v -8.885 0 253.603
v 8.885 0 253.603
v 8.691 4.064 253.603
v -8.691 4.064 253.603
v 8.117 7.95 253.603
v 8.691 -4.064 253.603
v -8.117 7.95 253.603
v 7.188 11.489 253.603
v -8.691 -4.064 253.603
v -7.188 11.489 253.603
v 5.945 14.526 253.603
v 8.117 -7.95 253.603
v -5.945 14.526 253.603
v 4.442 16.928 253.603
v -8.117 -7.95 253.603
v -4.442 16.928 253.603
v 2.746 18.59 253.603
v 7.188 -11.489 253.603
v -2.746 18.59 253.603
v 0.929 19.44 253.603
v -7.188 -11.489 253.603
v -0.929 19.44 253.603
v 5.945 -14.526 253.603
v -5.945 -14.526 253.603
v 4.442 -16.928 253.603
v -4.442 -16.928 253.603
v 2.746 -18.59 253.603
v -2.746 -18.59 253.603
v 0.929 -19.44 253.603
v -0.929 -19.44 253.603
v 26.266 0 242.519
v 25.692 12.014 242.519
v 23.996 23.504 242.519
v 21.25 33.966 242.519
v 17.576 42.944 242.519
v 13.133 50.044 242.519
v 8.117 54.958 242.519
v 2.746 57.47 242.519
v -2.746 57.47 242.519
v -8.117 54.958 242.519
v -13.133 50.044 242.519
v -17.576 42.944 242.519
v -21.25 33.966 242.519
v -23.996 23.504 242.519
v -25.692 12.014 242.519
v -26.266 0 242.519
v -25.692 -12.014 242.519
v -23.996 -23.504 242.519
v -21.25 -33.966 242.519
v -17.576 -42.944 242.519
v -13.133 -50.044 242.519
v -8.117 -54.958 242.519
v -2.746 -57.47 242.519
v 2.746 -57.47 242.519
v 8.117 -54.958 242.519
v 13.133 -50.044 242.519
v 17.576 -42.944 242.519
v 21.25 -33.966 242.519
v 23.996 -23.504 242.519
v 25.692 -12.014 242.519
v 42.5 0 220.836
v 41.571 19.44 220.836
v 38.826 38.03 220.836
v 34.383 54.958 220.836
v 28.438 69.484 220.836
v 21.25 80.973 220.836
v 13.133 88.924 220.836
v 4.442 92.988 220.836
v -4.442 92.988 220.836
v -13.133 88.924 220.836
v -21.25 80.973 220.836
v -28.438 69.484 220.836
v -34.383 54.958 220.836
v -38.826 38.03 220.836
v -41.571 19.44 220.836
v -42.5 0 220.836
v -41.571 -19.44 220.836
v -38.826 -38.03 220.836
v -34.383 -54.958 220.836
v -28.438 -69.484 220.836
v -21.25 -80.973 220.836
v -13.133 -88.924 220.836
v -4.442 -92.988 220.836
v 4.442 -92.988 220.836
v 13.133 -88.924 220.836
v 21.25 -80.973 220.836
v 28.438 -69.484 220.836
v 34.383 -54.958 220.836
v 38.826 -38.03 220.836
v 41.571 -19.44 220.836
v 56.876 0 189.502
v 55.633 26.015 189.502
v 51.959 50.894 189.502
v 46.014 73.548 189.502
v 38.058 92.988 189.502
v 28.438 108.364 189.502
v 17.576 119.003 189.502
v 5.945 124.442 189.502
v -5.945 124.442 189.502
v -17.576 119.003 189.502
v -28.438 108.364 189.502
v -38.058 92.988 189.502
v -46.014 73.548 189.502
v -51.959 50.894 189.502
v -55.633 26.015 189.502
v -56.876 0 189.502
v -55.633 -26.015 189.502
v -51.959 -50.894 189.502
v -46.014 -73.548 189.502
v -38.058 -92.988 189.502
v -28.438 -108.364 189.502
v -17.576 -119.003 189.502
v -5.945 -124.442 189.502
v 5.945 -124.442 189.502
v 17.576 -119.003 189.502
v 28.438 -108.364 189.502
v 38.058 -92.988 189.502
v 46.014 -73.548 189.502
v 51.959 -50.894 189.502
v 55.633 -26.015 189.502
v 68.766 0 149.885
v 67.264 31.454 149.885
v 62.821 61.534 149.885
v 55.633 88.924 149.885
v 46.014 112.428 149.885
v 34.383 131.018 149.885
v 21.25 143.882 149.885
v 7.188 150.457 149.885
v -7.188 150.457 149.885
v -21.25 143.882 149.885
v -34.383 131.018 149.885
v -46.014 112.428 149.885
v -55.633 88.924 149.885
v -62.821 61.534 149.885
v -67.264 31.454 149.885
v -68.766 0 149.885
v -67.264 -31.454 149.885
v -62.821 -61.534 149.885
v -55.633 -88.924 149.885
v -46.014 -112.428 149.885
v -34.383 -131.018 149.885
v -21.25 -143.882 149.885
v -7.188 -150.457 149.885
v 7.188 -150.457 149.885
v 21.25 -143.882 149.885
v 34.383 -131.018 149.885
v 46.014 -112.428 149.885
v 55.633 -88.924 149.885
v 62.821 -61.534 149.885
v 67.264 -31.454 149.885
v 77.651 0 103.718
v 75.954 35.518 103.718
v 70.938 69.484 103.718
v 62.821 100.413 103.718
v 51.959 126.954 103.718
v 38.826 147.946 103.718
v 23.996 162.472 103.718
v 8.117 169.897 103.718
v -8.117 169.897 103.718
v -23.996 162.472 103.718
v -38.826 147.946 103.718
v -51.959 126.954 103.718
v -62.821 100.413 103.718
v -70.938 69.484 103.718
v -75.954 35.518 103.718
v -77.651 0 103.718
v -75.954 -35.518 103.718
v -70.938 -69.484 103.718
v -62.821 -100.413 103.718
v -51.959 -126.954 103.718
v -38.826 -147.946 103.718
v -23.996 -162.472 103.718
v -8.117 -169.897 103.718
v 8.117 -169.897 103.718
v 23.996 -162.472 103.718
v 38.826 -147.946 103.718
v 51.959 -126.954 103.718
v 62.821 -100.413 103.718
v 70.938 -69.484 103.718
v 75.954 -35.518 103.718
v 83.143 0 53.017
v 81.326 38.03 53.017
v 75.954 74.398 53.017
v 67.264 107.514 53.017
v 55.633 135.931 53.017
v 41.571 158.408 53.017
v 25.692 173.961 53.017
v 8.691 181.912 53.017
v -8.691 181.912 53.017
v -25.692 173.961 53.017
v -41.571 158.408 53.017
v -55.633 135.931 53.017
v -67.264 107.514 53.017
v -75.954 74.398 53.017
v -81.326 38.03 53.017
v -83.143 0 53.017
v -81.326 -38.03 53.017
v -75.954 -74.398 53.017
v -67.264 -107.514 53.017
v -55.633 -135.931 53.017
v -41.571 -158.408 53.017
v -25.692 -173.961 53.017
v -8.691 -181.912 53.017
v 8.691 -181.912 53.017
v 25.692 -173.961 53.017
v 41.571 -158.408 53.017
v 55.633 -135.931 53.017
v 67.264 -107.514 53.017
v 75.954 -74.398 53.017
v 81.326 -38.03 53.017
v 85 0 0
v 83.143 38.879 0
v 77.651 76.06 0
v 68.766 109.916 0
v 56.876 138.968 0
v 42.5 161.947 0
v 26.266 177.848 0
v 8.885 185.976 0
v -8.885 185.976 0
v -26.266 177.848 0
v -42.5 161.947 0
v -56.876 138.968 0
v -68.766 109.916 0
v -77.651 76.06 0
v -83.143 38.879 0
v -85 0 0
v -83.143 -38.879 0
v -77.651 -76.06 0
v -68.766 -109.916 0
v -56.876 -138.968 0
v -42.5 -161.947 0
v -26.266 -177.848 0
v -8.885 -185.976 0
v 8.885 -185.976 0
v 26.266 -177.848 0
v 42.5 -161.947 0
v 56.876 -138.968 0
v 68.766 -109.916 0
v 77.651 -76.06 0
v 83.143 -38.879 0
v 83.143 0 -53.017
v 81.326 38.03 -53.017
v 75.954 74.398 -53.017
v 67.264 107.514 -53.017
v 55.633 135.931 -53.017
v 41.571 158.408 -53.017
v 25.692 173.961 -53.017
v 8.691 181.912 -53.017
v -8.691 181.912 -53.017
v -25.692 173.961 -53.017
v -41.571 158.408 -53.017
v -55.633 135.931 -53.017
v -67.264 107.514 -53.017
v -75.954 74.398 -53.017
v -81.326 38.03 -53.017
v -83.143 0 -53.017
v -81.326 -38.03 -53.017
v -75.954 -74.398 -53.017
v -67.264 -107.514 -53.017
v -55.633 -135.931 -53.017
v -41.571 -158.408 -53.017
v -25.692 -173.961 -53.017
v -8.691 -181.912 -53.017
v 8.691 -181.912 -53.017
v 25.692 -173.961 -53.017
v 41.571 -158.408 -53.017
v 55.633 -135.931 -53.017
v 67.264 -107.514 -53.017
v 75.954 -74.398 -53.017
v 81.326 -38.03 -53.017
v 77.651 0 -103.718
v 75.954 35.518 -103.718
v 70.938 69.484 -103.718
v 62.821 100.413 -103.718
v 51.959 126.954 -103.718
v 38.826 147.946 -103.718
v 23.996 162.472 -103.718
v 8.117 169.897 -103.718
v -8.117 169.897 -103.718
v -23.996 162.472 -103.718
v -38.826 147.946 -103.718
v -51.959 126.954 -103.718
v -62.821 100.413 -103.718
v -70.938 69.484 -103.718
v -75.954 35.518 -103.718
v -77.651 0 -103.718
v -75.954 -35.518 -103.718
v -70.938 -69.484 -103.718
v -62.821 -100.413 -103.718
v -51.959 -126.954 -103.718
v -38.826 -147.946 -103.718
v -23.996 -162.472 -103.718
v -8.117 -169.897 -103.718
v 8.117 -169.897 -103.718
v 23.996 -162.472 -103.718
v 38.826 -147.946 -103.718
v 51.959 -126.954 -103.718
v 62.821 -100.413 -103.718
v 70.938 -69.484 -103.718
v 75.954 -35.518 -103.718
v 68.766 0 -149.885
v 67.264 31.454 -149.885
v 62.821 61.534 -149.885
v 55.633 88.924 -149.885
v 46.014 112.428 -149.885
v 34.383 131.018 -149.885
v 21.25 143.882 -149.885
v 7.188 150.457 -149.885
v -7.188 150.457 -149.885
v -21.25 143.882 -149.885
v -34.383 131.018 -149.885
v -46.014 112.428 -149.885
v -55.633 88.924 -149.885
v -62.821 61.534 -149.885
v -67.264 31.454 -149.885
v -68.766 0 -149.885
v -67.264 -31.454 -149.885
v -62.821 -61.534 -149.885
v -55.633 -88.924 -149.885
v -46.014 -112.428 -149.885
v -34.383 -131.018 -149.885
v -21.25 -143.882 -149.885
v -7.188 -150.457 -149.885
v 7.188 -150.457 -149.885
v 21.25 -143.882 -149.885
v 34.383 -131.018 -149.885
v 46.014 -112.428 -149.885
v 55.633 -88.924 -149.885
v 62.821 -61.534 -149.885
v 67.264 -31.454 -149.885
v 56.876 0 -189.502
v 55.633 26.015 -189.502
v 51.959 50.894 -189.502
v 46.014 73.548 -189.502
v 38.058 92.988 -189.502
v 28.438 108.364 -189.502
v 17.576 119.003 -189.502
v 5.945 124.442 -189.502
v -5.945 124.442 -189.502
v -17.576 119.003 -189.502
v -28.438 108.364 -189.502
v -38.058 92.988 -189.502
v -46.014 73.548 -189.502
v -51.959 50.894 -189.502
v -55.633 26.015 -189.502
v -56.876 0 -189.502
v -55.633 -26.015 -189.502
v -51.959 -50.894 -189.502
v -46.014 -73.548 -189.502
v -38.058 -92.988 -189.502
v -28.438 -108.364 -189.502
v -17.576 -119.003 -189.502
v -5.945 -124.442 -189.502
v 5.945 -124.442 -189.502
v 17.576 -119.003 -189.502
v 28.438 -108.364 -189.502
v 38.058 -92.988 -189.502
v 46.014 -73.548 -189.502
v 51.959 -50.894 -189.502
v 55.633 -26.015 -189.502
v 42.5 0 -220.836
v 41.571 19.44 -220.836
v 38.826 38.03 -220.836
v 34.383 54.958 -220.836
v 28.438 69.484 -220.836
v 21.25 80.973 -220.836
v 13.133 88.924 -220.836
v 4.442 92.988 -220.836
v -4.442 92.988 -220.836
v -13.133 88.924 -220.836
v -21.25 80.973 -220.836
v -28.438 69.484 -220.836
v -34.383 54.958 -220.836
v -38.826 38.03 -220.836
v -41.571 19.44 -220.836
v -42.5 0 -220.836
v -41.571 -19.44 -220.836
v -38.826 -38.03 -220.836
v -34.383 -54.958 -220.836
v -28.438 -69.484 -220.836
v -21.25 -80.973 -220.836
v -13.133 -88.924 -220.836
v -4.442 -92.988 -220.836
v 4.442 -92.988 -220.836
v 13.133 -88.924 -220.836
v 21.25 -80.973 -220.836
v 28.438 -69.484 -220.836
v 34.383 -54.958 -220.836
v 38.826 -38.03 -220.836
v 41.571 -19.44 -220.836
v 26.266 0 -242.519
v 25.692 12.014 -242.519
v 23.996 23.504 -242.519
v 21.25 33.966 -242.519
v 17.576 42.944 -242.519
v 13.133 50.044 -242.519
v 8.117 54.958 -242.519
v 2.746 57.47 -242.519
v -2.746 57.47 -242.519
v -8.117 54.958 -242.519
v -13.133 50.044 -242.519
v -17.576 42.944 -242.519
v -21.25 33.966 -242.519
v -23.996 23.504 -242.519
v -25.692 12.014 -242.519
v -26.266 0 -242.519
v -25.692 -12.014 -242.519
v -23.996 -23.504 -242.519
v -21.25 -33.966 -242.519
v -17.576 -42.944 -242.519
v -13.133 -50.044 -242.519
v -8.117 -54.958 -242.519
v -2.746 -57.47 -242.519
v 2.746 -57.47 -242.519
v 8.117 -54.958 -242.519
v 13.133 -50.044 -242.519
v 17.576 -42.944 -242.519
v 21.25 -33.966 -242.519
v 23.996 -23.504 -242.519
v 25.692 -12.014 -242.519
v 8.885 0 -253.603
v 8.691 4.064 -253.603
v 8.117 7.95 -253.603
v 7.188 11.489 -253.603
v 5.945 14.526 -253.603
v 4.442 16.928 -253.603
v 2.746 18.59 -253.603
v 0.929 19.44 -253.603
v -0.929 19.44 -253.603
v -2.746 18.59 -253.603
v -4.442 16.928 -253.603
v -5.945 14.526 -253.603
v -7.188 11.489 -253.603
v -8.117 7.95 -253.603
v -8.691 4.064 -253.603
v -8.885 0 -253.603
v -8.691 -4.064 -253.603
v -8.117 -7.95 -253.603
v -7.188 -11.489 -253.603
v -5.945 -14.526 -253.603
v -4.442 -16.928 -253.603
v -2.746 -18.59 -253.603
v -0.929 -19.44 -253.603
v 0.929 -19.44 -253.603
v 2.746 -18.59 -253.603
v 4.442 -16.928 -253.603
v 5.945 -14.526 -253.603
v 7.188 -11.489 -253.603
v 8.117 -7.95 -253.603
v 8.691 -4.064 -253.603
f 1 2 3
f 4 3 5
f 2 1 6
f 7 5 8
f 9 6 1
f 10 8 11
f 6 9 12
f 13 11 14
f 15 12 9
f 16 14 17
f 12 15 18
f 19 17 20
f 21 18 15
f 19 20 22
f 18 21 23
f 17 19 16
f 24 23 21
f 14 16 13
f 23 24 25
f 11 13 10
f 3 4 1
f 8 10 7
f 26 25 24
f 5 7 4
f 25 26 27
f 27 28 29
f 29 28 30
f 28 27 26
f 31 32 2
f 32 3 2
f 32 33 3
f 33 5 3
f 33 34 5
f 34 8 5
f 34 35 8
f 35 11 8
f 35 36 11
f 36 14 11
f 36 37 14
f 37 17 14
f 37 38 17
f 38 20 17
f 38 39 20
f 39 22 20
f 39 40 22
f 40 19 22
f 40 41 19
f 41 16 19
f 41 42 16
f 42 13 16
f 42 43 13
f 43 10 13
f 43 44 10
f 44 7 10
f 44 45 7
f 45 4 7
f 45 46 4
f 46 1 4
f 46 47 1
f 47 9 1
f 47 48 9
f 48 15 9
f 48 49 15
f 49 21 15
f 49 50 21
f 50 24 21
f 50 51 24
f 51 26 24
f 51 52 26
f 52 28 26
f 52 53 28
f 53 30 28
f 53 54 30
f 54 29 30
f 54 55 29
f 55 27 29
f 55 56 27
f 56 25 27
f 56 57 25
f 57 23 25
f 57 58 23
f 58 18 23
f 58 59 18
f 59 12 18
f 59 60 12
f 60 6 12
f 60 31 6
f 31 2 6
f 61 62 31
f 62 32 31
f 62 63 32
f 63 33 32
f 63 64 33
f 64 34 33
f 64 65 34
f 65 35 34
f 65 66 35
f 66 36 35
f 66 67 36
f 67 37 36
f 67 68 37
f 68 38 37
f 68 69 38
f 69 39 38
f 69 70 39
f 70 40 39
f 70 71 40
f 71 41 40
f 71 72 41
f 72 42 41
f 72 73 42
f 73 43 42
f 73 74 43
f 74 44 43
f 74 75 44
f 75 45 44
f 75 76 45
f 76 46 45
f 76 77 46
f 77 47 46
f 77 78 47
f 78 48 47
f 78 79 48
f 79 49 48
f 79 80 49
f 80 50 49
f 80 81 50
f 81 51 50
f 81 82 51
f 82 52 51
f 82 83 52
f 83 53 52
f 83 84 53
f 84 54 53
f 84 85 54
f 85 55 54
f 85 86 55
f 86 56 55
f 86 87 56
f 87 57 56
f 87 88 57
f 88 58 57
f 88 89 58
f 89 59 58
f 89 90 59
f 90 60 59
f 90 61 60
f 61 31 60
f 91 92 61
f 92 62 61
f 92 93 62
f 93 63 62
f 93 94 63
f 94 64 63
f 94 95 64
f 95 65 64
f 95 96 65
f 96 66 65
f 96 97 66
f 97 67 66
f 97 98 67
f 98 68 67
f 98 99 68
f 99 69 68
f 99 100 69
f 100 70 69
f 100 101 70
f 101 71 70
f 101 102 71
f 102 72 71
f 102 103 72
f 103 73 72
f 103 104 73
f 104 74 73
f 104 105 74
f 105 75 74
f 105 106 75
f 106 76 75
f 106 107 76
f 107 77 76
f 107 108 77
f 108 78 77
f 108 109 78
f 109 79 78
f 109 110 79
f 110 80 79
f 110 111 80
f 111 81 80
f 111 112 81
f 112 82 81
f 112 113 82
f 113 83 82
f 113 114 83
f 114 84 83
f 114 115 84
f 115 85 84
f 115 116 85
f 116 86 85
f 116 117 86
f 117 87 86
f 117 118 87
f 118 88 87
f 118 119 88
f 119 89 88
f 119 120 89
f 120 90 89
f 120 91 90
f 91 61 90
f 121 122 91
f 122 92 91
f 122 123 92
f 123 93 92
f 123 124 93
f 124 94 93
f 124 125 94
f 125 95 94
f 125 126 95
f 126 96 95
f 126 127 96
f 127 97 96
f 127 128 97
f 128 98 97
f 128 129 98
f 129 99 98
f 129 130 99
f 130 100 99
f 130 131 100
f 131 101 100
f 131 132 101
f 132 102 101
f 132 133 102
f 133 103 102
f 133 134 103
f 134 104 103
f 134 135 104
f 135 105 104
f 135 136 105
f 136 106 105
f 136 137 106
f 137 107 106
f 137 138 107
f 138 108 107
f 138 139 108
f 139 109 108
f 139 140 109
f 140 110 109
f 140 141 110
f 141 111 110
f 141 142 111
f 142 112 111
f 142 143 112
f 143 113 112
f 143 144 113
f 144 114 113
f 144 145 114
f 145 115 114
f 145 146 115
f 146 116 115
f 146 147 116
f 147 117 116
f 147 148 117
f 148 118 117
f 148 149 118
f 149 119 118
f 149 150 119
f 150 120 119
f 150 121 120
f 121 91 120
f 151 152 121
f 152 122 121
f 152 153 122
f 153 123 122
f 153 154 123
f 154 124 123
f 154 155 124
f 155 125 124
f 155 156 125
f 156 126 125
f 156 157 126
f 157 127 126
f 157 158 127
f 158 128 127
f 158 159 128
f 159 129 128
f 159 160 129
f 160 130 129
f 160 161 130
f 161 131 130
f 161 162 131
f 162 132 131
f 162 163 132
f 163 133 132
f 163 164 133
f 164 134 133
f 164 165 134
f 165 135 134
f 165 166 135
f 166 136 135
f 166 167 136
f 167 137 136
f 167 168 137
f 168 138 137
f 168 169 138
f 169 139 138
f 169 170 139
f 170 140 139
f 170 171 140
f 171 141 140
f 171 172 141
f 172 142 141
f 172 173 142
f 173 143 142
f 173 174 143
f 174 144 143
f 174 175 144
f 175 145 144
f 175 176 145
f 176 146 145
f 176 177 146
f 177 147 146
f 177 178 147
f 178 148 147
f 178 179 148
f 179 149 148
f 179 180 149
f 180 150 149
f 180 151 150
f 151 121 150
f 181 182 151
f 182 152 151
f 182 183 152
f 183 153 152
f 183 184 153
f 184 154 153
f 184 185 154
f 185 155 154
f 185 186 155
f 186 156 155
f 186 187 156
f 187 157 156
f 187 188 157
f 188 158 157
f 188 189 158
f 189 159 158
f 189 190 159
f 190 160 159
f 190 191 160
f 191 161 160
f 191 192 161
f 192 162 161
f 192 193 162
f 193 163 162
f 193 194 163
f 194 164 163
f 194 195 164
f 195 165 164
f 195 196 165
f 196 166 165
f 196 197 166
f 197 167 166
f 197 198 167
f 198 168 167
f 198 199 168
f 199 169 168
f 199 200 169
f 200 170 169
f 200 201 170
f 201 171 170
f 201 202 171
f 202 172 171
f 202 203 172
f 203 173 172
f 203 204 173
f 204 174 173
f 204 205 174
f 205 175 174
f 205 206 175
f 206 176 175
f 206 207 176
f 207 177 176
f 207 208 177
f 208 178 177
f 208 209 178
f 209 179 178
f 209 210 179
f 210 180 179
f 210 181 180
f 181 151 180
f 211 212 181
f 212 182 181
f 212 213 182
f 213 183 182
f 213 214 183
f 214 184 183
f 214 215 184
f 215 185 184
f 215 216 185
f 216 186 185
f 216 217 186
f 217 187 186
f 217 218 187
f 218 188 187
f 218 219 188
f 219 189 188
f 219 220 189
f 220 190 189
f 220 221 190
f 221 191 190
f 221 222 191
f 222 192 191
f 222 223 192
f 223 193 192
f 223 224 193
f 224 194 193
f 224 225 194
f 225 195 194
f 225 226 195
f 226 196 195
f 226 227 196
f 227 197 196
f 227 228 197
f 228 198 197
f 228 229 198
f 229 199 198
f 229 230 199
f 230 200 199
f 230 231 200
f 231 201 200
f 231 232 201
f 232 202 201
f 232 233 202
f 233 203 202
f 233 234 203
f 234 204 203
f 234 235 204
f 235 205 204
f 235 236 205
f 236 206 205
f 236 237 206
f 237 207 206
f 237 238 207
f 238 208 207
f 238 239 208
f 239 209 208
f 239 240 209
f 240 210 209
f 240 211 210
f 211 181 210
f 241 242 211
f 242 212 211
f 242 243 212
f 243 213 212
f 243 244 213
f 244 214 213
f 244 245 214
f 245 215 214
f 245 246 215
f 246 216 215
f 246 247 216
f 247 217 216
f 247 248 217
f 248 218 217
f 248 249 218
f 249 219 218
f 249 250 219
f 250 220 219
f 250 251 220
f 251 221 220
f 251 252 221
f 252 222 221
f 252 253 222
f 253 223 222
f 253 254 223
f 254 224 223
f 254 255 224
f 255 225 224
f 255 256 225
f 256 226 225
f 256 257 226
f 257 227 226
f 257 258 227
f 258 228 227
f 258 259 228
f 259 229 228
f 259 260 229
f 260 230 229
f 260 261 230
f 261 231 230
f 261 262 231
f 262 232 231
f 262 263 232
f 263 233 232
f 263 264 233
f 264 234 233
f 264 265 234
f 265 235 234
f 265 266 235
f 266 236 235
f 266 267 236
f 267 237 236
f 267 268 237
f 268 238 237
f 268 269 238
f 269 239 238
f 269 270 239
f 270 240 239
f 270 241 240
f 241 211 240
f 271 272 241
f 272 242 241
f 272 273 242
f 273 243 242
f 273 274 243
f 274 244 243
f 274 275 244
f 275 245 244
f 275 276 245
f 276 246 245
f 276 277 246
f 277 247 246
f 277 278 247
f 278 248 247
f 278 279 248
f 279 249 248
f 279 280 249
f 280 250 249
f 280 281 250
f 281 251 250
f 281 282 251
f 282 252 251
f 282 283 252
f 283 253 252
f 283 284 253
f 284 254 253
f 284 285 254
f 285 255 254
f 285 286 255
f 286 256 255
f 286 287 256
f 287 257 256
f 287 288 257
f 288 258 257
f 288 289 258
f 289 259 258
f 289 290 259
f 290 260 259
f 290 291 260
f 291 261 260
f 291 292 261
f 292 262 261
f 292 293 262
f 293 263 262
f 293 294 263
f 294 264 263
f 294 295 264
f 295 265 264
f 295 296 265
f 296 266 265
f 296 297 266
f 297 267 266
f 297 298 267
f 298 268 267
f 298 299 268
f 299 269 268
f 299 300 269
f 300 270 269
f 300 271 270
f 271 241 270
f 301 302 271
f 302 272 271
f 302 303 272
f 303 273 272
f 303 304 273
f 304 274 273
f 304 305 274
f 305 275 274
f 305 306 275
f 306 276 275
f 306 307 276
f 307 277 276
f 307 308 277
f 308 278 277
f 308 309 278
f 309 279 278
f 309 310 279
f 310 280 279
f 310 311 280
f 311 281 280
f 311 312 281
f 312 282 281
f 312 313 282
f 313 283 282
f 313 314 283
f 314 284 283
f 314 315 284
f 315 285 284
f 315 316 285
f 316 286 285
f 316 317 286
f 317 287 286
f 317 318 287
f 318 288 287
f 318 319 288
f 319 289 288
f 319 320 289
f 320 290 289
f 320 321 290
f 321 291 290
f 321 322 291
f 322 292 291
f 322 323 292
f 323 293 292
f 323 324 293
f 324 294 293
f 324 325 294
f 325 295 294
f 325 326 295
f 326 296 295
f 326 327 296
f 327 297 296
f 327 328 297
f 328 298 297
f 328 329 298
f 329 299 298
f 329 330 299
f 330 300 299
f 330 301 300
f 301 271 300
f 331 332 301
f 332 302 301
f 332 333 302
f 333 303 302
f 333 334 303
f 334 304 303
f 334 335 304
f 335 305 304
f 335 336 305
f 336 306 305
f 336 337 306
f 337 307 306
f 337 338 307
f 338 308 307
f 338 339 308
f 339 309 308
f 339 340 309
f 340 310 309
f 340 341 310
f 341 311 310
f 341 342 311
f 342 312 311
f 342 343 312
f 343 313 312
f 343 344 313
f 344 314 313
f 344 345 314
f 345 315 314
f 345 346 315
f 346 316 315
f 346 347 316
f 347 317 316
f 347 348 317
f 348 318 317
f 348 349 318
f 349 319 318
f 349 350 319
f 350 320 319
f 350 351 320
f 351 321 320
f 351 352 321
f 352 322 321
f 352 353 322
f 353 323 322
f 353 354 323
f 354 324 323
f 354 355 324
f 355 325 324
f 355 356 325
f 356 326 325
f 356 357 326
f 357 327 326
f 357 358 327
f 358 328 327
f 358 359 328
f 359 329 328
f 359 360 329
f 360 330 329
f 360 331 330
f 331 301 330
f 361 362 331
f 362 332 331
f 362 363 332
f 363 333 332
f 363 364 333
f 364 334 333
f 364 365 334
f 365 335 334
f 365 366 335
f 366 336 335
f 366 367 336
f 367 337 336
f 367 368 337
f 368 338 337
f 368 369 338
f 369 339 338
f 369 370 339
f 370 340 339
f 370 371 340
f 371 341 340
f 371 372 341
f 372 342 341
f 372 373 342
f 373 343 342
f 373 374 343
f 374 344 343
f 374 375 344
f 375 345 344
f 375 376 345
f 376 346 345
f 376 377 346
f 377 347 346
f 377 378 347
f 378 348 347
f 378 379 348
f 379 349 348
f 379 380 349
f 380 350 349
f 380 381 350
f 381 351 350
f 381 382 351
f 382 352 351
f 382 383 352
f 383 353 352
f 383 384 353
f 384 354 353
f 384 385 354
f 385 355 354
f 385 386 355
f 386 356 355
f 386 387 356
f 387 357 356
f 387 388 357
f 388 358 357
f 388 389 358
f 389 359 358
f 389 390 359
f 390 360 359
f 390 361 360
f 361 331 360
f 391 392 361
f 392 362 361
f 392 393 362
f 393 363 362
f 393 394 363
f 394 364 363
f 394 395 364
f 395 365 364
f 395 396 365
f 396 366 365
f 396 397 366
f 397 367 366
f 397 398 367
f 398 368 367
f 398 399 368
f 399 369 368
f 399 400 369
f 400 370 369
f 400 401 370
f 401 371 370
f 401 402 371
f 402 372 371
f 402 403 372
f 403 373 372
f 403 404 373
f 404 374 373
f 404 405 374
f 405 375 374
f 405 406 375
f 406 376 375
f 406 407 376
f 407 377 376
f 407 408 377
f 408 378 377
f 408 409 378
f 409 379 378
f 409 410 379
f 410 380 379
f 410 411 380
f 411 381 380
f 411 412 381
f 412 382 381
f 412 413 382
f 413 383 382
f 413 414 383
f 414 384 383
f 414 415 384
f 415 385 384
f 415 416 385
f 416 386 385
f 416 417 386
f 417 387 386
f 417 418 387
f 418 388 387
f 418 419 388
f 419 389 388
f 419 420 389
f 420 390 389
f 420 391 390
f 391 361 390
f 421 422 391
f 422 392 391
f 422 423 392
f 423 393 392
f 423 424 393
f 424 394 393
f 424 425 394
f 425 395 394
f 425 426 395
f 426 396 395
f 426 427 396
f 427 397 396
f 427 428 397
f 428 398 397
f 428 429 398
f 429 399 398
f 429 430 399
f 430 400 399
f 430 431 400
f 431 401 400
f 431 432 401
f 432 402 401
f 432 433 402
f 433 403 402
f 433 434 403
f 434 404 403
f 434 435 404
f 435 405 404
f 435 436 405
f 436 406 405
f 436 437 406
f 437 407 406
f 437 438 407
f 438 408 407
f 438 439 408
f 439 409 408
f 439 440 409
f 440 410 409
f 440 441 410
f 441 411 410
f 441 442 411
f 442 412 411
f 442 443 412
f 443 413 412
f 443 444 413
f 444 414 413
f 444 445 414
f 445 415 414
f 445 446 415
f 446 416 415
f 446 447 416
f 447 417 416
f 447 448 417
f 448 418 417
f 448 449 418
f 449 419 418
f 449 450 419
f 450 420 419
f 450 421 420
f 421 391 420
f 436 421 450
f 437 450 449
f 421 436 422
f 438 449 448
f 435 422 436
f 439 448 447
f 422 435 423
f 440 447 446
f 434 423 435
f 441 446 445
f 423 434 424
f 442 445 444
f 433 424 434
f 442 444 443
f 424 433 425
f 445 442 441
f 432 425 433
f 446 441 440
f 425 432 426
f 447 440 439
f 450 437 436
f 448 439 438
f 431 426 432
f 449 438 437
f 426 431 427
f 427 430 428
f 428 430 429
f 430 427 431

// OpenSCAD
// Generated by SolidPython 1.0.1 on 2020-07-29 00:39:26


scale(v = [5, 11, 15]) {
	sphere(r = 17);
}
/***********************************************
*********      SolidPython code:      **********
************************************************
 
# import packages: SolidPython
from solid import *
from solid.utils import *
from itertools import chain, combinations


class Resize:

    def __init__(self, scad_file):
        self.scad_file = scad_file
        #self.scad_file = import_scad(scad_file)
        # cone/cylinder param:
        self.r1 = 0
        self.r2 = 0
        self.h = 0
        # rectangular prism param:
        self.w = 0
        self.l = 0
        # ellipse param:
        self.r = 0

    # import OpenScad code (file name corresponds to shape)


    # classify shape + parameters
    def assign(self, param1, param2, param3):
        if self.scad_file == 'cone.scad':
            self.r1 = param1
            self.r2 = param2
            self.h = param3
        elif self.scad_file == 'cylinder.scad':
            self.r1 = param1
            self.r2 = param2
            self.h = param3
        elif self.scad_file == 'rectangularPrism.scad':
            self.h = param1
            self.l = param2
            self.w = param3
        else:
            self.r = param1
            self.h = param2

    # resize parameters
    def iterate(self):
        x = range(3, 20, 2)
        i = 1
        if self.scad_file == 'cone.scad':
            tempList = list(combinations(x, 2))
            for temp in tempList:
                param1 = temp[0]
                param2 = temp[1]
                filepath = 'produced_scad_files/' + 'cone' + str(param1) + '_' + str(param2) + '_' + '.scad'
                scad_render_to_file(cylinder(h=param1, r1=param2, r2=0), filepath)

        elif self.scad_file == 'cylinder.scad':
            tempList = list(combinations(x, 3))
            for temp in tempList:
                param1 = temp[0]
                param2 = temp[1]
                filepath = 'produced_scad_files/' + 'cylinder' + str(param1) + '_' + str(param2) + '_' + '.scad'
                scad_render_to_file(cylinder(h=param1, r1=param2, r2=param2), filepath)

        elif self.scad_file == 'rectangularPrism.scad':
            tempList = list(combinations(x, 3))
            for temp in tempList:
                param1 = temp[0]
                param2 = temp[1]
                param3 = temp[2]
                filepath = 'produced_scad_files/' + 'rectangularPrism' + str(param1) + '_' + str(param2) + '_' + str(
                    param3) + '.scad'
                scad_render_to_file(cube(size=(param1, param2, param3)), filepath)

        elif self.scad_file == 'ellipse.scad':
            tempList = list(combinations(x, 4))
            for temp in tempList:
                param1 = temp[0]
                param2 = temp[1]
                param3 = temp[2]
                param4 = temp[3]
                filepath = 'produced_scad_files/' + 'ellipse' + str(param1) + '_' + str(param2) + '_' + str(param3) + '_' + str(param4) + '.scad'
                scad_render_to_file(scale([param1, param2, param3])(sphere(r=param4)), filepath)

    def render_to_scadfile(self):
        scad_render_to_file(scad, 'example.scad') 
 
************************************************/
